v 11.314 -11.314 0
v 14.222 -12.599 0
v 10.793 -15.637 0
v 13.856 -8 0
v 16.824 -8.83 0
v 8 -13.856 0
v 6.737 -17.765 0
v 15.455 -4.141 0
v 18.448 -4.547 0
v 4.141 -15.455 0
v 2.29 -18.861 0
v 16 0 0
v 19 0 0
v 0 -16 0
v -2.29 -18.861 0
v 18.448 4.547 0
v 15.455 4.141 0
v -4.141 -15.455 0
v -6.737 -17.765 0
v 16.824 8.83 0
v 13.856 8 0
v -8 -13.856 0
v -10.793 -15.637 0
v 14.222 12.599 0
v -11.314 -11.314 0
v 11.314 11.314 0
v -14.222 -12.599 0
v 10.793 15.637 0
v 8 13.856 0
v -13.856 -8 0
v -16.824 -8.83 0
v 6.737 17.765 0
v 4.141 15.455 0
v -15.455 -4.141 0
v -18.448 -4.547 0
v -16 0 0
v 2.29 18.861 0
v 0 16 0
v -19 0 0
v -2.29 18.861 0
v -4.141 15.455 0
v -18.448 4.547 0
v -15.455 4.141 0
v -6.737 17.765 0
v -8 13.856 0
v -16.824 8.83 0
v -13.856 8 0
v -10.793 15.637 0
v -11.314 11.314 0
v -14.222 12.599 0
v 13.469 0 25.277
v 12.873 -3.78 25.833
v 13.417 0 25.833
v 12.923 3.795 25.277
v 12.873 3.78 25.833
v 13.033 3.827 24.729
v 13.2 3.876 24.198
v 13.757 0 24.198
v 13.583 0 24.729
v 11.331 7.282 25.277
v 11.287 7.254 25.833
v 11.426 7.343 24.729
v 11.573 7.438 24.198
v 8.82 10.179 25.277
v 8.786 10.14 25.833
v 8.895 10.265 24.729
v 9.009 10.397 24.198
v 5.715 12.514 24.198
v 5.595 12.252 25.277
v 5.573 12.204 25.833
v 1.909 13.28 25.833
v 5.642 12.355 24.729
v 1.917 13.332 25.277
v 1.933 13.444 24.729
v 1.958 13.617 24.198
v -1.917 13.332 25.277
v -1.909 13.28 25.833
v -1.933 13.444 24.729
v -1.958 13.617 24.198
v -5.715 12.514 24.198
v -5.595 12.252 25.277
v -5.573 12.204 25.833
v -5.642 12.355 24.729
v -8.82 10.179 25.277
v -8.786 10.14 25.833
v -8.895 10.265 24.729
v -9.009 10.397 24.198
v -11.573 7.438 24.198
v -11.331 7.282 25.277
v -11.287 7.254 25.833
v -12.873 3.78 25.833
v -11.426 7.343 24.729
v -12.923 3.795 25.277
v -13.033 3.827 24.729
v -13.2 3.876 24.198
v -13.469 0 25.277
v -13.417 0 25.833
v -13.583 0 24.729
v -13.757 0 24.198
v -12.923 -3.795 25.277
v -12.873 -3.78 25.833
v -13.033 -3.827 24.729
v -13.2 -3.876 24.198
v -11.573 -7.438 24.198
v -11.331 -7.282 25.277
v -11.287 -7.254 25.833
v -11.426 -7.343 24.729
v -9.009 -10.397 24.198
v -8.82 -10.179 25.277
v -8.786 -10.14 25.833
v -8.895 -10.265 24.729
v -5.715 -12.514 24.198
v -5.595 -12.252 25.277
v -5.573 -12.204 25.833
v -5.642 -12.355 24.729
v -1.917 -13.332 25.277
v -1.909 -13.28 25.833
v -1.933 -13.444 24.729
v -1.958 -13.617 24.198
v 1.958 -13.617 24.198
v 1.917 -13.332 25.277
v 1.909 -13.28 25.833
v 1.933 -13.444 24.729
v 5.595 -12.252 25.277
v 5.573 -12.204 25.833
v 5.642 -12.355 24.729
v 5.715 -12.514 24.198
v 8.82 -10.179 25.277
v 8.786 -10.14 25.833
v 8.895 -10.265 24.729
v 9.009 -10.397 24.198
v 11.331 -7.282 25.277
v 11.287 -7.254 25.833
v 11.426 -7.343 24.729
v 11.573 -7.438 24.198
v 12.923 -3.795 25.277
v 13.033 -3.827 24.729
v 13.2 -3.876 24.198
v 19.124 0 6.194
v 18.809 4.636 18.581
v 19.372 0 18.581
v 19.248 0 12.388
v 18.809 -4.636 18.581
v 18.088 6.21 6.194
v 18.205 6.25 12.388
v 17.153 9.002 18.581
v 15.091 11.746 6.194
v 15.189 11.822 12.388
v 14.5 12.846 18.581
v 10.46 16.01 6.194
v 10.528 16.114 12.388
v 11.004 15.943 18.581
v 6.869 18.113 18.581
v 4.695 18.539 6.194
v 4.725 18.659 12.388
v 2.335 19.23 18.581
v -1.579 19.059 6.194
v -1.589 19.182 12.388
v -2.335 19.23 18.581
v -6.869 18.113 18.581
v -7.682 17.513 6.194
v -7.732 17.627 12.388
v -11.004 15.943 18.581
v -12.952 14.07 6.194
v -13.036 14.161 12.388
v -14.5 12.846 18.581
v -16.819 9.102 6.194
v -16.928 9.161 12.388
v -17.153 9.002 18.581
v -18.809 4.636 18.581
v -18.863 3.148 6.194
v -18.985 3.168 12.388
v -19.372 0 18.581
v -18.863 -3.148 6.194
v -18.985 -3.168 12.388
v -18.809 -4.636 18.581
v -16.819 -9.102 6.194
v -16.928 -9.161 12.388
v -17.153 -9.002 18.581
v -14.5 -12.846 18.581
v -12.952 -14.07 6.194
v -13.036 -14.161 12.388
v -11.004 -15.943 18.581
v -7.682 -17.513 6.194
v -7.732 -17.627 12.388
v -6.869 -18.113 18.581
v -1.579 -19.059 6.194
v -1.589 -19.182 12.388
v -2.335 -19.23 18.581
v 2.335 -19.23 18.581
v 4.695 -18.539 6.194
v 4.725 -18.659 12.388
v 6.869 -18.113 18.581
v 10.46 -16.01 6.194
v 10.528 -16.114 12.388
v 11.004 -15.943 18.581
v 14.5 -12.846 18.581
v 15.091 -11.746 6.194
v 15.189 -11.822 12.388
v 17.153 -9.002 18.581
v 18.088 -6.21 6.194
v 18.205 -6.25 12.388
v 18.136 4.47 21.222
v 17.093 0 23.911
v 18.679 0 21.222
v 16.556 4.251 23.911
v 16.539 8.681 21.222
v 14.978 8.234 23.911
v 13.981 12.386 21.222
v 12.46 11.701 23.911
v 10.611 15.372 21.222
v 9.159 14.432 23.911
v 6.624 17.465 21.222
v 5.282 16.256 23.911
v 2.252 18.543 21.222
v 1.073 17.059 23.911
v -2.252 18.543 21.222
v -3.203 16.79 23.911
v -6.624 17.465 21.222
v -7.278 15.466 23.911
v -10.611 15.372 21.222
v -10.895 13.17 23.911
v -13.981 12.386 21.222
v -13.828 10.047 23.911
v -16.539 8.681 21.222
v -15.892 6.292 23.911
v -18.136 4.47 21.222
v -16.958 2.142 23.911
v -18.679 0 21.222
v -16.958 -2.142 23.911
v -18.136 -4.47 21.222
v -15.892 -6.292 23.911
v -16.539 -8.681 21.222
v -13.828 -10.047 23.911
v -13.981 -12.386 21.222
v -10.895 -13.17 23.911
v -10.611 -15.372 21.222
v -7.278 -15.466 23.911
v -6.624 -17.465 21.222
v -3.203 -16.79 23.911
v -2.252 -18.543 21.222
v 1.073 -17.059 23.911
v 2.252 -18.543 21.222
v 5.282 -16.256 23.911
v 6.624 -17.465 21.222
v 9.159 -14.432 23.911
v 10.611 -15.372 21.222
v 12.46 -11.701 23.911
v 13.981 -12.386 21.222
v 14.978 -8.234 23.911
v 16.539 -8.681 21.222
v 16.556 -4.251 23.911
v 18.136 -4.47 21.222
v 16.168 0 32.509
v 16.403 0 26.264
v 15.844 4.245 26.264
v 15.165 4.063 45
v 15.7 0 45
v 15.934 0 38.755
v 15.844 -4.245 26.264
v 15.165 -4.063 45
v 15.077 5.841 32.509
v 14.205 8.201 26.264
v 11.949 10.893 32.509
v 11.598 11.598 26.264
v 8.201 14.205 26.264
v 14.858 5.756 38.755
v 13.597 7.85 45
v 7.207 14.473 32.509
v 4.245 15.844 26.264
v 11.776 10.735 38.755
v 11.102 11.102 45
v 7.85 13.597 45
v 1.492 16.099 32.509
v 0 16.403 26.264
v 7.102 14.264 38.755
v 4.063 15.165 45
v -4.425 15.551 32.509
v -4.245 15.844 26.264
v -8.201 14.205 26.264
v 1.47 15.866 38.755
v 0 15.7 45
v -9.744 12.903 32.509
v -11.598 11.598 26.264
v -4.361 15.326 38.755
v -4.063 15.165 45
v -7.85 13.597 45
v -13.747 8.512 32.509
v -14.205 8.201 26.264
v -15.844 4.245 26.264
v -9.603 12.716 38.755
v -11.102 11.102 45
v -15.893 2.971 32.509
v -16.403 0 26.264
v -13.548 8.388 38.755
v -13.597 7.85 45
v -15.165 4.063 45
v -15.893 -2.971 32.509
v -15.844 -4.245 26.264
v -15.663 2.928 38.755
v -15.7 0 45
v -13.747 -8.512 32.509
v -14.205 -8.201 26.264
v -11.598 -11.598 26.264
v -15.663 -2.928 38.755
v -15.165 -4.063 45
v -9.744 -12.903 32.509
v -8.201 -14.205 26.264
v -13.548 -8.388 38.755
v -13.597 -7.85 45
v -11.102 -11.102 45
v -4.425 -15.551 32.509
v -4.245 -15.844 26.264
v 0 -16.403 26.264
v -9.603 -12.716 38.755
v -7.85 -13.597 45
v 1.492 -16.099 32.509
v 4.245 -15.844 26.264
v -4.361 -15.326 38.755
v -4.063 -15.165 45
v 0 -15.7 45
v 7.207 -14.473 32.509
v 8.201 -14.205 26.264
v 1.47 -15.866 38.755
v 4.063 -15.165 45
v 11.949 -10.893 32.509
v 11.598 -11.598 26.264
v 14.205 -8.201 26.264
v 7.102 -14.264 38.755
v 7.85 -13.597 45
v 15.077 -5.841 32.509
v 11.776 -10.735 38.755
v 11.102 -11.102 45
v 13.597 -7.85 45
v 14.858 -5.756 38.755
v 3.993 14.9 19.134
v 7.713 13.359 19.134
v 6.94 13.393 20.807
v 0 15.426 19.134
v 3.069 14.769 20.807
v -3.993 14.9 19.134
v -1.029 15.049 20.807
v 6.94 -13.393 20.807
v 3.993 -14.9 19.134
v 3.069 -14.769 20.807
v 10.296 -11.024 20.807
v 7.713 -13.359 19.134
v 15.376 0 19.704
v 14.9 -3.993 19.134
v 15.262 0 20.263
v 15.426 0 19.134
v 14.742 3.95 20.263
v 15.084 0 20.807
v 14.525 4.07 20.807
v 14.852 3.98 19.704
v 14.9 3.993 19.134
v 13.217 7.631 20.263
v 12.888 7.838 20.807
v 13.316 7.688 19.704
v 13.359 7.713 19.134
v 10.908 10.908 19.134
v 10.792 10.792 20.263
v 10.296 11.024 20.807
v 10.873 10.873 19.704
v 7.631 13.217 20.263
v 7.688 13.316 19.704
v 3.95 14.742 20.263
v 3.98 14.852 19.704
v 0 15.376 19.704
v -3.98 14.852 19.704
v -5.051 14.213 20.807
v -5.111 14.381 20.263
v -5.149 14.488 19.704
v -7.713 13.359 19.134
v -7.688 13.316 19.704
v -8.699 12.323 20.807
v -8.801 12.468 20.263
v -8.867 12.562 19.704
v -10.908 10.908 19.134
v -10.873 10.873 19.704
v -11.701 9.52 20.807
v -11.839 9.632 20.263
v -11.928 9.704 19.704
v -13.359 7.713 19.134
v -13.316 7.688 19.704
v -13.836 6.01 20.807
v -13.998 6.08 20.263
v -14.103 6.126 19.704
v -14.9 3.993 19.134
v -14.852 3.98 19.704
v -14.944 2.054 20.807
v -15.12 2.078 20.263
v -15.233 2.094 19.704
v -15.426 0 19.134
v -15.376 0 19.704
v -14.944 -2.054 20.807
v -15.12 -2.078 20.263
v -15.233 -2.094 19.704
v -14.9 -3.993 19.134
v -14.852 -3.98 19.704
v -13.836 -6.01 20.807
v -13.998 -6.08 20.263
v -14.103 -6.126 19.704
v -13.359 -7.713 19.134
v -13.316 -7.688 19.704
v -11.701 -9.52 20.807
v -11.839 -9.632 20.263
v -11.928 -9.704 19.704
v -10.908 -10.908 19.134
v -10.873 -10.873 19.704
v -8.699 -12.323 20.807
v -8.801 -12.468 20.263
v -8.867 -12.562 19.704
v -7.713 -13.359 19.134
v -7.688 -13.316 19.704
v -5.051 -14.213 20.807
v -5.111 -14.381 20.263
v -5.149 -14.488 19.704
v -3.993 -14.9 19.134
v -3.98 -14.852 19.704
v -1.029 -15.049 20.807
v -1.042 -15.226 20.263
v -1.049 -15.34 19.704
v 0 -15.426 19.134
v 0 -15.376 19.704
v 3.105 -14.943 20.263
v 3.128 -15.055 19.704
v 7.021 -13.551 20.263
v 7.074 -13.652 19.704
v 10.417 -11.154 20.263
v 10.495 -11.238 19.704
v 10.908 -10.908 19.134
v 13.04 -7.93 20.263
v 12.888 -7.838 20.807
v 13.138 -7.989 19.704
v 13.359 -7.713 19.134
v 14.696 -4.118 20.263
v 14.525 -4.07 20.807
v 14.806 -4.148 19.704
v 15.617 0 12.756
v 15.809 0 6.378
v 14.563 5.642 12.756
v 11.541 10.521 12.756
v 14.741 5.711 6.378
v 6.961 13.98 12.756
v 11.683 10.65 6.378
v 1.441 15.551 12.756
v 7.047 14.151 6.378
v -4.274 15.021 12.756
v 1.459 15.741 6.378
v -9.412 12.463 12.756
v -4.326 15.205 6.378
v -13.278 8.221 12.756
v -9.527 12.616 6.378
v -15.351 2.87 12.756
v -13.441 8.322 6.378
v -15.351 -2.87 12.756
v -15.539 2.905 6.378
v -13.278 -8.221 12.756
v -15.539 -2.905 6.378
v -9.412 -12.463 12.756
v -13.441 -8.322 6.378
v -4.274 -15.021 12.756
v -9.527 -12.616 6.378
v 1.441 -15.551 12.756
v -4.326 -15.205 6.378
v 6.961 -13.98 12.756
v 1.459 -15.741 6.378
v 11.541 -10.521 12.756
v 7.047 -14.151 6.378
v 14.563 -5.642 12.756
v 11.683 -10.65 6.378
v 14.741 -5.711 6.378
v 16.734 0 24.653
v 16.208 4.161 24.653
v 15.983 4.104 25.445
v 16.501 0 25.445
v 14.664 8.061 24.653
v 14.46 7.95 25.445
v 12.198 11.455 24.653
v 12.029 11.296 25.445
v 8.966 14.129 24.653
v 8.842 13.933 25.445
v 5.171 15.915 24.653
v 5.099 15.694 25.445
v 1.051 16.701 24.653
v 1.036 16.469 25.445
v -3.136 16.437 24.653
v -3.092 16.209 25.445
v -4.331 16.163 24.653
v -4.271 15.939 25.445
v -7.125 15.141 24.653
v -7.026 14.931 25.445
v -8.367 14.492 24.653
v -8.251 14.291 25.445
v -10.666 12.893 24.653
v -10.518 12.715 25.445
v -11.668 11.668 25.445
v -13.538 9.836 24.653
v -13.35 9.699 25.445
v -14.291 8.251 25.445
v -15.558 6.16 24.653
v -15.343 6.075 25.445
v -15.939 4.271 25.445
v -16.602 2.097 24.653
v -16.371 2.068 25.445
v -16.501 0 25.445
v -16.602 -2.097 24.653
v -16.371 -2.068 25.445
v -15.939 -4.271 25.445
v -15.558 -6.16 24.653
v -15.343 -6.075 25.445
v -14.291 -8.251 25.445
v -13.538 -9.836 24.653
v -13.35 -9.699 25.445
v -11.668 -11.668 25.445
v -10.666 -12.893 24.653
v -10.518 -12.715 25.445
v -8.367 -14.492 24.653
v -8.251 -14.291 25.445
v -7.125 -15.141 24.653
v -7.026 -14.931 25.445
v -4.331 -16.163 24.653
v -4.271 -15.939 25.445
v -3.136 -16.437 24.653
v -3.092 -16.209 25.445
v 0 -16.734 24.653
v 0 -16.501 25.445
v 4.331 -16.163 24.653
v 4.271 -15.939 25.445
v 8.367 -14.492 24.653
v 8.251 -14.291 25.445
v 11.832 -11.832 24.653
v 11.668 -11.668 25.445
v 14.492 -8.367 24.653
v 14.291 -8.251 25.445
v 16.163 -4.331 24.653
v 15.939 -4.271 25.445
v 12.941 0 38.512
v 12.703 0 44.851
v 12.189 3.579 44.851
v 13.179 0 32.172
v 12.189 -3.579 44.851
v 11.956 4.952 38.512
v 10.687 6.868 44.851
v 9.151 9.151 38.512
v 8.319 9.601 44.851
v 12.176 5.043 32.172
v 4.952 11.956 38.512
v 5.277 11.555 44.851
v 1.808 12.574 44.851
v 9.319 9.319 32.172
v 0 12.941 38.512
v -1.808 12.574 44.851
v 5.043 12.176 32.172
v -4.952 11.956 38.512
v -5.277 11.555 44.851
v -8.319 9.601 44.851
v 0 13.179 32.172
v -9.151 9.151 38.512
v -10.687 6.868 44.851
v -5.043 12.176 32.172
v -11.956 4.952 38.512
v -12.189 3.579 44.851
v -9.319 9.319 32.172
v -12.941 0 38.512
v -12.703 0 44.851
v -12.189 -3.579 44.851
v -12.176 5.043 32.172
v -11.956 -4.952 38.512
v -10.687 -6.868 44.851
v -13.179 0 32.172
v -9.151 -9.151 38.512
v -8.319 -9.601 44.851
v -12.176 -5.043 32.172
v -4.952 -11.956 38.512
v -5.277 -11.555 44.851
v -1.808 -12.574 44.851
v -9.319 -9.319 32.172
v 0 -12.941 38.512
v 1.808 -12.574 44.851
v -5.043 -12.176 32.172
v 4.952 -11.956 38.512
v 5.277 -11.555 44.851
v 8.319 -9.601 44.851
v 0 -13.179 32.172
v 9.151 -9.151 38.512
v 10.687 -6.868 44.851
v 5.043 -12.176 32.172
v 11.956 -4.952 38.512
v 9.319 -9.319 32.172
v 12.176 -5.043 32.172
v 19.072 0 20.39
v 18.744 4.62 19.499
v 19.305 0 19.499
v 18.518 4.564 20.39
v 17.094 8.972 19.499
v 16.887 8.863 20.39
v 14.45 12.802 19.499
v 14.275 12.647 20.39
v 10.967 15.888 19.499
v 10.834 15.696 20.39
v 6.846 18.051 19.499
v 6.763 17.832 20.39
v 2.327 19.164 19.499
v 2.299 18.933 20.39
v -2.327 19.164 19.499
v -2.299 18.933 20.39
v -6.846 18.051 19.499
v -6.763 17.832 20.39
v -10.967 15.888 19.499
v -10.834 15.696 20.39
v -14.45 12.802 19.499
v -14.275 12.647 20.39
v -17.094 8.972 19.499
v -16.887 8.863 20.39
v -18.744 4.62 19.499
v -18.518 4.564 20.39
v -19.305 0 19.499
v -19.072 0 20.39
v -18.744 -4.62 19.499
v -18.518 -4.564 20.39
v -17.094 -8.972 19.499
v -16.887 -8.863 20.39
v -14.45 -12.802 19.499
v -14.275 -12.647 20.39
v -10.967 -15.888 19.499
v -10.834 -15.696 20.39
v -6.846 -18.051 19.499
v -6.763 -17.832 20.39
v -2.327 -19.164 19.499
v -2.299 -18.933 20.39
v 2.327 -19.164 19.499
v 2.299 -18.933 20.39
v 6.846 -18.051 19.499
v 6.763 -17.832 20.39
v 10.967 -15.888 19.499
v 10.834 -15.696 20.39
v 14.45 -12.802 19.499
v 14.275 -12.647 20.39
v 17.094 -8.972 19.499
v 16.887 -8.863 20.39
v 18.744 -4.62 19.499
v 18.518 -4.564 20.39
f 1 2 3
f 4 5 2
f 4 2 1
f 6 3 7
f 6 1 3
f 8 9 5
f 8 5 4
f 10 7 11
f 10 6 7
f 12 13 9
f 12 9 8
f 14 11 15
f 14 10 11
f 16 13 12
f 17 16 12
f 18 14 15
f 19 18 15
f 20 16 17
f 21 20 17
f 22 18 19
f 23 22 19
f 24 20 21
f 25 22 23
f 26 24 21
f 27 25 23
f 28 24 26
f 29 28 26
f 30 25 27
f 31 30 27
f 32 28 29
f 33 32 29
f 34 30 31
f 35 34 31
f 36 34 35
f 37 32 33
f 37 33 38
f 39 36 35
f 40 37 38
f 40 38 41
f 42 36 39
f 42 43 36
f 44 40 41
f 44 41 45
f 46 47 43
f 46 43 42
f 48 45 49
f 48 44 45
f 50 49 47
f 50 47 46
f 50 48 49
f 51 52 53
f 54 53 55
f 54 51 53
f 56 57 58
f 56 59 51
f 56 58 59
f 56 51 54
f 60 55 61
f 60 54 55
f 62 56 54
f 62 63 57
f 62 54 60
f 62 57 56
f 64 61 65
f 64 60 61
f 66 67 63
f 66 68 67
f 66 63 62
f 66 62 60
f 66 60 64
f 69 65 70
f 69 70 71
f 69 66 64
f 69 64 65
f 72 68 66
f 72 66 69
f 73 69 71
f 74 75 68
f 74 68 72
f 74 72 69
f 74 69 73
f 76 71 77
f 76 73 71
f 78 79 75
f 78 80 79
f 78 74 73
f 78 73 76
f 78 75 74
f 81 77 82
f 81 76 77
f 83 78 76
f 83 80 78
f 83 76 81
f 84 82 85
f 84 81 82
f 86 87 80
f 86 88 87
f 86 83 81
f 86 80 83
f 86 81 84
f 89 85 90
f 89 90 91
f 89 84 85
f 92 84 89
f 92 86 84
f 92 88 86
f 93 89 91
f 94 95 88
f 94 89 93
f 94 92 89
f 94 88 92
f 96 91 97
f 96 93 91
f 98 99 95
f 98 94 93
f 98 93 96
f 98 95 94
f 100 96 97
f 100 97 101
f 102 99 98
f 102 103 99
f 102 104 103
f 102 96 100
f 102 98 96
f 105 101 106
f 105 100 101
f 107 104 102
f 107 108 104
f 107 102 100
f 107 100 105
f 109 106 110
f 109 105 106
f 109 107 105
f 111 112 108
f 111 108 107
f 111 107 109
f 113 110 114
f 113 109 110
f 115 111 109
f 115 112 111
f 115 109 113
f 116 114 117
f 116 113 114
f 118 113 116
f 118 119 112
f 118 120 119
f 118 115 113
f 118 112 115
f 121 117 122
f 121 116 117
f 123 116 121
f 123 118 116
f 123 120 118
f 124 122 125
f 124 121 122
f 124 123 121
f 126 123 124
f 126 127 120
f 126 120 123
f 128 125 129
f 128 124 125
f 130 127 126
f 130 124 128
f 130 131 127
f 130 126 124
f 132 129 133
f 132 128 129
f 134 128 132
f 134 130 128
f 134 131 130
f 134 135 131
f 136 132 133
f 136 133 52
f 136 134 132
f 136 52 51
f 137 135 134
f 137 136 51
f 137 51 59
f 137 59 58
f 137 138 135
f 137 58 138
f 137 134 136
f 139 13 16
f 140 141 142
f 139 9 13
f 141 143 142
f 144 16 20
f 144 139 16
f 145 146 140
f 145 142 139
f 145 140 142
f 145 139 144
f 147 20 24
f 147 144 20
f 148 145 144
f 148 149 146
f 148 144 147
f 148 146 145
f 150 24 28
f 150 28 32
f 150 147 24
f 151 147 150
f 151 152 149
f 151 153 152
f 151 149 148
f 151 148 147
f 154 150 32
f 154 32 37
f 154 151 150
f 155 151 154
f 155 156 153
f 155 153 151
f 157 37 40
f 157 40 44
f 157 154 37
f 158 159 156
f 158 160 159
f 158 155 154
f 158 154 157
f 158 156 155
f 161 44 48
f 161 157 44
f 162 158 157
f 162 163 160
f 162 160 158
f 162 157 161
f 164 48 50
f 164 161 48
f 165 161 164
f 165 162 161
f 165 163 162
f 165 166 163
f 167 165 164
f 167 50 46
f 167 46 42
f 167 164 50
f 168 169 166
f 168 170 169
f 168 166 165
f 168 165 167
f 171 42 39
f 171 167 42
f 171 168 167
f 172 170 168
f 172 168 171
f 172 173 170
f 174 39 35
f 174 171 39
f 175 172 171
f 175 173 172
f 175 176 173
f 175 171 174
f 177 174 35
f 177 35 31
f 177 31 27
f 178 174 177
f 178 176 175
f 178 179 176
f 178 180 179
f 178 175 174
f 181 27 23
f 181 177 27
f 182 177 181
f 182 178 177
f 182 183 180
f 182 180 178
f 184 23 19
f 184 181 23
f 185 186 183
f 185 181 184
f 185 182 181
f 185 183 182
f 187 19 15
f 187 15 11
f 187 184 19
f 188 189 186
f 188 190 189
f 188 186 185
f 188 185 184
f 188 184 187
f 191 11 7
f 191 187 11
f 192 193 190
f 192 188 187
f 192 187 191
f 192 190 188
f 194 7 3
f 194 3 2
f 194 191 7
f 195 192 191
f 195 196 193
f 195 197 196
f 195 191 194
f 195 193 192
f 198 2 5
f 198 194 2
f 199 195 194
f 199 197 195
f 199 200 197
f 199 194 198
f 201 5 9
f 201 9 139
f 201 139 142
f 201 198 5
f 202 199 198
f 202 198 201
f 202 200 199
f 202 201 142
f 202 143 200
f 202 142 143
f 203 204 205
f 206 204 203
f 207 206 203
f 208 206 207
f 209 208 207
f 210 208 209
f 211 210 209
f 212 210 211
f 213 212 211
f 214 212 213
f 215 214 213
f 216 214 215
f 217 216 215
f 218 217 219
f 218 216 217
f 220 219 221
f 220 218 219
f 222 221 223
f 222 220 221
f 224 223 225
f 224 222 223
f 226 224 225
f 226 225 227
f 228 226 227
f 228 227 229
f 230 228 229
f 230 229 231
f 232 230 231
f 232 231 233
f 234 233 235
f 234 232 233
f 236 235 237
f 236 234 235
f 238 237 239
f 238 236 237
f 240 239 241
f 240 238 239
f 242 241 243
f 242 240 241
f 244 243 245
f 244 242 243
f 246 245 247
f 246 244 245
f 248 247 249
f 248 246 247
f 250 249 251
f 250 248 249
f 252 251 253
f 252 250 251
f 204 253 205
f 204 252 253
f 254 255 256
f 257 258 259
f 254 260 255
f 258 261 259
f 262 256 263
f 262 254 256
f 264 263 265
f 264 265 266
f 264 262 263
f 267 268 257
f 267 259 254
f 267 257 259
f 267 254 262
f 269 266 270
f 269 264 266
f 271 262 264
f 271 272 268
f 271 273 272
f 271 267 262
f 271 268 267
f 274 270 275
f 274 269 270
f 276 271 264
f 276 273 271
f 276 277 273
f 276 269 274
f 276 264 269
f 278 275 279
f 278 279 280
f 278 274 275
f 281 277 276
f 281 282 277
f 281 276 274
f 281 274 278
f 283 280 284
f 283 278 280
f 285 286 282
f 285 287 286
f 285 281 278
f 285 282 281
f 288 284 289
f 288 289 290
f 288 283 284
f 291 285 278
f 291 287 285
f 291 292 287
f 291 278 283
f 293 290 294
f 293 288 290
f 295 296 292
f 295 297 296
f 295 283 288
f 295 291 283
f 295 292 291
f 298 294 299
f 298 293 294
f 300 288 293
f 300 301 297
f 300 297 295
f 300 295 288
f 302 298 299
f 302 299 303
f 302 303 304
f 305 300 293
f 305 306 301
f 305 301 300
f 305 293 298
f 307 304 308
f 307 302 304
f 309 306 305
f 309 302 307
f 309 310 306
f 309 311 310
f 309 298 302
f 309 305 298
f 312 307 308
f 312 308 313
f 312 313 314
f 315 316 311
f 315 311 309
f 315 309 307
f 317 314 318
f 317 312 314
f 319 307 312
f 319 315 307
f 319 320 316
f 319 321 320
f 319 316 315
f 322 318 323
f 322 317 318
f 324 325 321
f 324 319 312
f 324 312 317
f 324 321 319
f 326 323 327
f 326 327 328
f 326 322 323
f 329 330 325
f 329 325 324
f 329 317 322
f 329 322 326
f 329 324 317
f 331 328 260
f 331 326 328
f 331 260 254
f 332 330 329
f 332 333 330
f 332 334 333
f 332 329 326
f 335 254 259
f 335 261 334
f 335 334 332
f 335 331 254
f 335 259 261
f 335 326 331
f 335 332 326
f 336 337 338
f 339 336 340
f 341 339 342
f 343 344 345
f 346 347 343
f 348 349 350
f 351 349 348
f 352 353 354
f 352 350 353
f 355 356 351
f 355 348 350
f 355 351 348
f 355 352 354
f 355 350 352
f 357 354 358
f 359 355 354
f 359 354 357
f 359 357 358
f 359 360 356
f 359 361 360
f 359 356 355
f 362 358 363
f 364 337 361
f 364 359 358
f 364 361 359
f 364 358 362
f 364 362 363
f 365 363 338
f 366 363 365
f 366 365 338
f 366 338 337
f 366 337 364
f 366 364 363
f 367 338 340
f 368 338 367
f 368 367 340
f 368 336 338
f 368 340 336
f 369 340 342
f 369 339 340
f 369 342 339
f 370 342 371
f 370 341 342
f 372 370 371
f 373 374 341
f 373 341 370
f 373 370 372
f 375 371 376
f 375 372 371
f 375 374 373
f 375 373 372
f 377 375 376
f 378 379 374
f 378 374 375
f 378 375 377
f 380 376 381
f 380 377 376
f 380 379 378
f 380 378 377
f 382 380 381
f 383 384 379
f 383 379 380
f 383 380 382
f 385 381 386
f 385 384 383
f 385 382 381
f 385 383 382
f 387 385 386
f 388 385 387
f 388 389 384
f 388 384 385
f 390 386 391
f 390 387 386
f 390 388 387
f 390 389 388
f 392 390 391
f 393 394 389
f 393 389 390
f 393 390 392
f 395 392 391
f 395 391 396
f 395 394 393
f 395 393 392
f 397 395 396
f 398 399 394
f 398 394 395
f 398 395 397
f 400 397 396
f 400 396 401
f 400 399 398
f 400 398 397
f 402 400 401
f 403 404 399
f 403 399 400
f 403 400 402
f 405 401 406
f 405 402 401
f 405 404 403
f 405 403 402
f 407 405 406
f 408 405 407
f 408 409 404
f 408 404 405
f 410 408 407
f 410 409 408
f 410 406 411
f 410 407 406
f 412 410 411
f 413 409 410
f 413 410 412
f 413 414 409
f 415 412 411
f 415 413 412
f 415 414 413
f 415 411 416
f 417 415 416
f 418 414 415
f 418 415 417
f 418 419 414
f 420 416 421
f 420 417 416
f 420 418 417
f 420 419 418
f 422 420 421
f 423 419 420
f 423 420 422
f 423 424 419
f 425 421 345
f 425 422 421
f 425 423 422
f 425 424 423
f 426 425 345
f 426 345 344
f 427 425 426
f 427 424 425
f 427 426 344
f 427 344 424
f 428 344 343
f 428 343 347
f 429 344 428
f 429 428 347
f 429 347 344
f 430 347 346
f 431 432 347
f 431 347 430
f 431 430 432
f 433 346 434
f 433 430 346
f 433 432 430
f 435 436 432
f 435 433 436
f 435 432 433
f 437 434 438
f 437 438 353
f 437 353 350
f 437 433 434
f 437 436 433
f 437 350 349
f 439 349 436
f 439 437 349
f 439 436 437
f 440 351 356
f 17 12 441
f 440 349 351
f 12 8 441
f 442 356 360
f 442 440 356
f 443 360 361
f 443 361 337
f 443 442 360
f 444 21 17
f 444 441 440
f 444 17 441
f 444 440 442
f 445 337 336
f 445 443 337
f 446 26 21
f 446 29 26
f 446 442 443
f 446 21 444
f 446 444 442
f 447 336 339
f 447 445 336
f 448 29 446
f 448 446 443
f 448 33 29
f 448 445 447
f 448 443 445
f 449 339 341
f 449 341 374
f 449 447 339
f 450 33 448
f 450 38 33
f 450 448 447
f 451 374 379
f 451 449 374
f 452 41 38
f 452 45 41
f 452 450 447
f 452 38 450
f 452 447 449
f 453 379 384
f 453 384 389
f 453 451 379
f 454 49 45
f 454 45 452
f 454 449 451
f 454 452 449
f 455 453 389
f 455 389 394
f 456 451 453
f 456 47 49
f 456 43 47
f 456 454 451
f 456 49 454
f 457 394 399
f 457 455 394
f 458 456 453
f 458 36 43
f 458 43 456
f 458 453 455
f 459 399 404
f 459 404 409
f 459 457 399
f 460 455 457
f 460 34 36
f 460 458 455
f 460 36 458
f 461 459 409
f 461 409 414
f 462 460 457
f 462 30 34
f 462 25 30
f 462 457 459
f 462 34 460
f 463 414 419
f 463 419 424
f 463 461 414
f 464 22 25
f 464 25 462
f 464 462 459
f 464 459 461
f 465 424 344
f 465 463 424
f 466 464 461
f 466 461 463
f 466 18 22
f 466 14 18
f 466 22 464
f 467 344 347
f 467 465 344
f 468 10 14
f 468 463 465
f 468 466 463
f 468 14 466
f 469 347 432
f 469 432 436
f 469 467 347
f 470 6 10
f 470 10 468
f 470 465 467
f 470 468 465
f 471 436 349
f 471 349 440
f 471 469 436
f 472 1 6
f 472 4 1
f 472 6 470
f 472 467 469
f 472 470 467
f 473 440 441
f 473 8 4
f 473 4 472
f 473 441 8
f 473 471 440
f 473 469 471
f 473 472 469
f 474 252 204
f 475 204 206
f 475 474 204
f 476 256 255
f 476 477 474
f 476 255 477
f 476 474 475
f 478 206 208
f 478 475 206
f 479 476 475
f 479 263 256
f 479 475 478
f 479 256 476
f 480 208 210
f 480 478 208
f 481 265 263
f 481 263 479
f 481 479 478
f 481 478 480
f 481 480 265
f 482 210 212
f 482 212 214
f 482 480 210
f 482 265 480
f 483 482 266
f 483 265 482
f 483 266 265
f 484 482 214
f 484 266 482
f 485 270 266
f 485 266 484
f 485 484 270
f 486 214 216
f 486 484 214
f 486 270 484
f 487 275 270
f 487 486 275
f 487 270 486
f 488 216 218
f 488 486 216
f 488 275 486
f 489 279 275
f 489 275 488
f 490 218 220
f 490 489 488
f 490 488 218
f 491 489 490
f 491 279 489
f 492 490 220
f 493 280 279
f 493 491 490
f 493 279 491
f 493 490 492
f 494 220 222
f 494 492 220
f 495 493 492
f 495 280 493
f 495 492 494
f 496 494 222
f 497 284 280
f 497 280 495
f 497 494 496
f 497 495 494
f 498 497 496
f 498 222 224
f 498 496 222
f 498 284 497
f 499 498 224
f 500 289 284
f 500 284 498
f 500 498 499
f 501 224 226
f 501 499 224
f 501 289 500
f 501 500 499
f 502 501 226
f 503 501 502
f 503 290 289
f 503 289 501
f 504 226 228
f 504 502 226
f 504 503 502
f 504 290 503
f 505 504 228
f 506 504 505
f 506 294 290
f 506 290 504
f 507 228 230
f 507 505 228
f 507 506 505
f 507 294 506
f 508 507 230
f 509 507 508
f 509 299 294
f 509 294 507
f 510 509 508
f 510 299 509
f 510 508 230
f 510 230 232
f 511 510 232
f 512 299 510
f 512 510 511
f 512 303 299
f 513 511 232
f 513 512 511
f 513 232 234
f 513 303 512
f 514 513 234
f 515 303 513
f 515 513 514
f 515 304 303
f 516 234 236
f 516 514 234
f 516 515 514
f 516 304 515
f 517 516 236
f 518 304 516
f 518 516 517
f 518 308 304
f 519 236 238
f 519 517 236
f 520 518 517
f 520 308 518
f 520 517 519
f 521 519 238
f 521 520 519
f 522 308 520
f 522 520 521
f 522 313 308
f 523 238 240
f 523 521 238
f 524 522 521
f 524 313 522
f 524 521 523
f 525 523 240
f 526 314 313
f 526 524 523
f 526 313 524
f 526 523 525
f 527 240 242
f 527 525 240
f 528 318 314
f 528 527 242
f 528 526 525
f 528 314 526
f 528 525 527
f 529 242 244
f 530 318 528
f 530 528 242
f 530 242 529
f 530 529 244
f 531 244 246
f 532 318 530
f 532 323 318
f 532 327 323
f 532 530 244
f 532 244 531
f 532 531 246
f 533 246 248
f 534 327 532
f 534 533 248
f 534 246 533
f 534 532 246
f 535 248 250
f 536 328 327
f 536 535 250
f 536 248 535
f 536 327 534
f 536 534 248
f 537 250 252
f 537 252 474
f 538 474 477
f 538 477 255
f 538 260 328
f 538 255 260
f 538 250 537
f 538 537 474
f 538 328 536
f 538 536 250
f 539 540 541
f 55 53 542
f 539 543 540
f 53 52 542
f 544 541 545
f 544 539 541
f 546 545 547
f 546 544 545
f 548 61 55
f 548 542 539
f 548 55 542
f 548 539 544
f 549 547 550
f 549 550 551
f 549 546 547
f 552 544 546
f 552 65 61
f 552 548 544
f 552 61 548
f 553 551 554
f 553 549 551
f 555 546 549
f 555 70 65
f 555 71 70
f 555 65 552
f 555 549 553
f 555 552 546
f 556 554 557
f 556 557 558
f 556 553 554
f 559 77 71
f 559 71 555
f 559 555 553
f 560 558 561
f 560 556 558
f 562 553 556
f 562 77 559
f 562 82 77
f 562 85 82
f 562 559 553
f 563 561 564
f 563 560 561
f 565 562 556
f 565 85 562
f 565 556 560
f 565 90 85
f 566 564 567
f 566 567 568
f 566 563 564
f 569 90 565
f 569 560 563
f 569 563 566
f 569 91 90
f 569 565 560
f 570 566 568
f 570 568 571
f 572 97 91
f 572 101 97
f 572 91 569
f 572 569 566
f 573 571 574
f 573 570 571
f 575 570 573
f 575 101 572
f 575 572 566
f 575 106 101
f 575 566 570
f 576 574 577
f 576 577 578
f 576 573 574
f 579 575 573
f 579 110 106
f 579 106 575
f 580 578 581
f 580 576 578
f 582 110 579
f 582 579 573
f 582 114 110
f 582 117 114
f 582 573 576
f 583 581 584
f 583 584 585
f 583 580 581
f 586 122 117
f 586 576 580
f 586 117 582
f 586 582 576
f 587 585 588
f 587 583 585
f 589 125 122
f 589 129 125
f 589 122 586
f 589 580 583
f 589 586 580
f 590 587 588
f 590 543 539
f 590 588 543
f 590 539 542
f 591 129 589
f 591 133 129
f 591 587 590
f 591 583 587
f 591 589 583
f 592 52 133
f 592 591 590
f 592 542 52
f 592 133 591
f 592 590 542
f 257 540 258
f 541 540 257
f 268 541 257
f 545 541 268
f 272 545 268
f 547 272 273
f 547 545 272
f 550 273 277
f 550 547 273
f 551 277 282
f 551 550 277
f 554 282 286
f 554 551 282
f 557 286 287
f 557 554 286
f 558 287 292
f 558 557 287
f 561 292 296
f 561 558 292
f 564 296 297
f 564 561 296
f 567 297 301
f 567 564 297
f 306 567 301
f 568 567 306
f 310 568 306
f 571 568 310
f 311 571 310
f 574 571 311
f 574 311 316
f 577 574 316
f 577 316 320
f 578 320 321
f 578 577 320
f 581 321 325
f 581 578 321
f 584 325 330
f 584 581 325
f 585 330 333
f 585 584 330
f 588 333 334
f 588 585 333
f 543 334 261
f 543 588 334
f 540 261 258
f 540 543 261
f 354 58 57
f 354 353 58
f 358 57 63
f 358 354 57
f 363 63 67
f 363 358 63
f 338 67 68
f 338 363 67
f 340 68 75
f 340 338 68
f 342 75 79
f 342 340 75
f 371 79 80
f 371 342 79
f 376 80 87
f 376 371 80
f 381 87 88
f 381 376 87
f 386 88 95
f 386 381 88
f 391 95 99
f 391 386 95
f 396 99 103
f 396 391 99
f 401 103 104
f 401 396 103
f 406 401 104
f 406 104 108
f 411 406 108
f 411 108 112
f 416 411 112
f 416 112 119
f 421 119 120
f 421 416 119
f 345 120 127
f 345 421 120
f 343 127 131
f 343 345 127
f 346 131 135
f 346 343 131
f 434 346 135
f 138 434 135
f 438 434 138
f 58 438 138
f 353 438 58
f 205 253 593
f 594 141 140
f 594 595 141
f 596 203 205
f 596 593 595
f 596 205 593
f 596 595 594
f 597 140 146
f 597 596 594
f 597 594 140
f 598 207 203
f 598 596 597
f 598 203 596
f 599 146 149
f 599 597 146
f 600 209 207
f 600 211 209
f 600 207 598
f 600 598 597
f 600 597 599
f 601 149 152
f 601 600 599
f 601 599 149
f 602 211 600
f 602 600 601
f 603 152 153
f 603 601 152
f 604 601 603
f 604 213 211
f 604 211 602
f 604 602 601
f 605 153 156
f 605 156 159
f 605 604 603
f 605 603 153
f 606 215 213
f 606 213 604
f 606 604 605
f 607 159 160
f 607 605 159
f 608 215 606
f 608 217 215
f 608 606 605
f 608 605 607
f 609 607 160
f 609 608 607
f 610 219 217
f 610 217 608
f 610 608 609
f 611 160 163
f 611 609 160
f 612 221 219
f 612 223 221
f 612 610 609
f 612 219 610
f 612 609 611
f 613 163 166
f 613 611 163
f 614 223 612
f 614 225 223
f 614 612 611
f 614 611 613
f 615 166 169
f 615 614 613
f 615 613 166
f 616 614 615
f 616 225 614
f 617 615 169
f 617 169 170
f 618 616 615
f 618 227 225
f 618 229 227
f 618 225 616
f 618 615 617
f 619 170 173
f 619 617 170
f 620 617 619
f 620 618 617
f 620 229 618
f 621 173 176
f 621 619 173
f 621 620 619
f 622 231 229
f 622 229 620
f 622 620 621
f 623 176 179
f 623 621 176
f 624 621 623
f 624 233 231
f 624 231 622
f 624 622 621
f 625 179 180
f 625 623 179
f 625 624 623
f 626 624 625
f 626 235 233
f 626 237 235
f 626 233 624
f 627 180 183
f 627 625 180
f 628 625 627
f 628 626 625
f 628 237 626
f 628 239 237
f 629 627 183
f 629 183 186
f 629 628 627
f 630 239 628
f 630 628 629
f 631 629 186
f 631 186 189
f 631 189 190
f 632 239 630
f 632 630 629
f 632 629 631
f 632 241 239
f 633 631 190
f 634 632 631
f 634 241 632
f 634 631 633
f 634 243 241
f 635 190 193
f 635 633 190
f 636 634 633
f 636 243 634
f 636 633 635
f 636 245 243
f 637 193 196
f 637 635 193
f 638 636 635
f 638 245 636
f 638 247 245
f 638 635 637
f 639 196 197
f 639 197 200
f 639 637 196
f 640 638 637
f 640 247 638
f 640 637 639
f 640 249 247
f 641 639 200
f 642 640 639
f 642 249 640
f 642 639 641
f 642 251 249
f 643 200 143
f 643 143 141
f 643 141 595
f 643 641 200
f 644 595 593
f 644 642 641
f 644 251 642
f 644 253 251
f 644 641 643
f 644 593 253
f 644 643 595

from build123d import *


with BuildPart() as f1:
    # F0 (on Front) → F1 (revolve)
    with BuildSketch(Plane.XZ):
        with BuildLine():
            Line((15.425971, 19.134293), (16, 0))
            Line((16, 0), (19, 0))
            Line((19, 0), (19.371627, 18.581355))
            ThreePointArc((19.371627, 18.581355), (19.209023, 19.949907), (18.678973, 21.22208))
            Line((18.678973, 21.22208), (17.092742, 23.910606))
            ThreePointArc((17.092742, 23.910606), (16.601144, 25.044324), (16.402601, 26.263982))
            Line((16.402601, 26.263982), (15.7, 45))
            Line((15.7, 45), (12.703474, 44.851139))
            Line((12.703474, 44.851139), (13.416649, 25.833132))
            ThreePointArc((13.416649, 25.833132), (13.518091, 25.00142), (13.756992, 24.198326))
            Line((13.756992, 24.198326), (15.084364, 20.806534))
            ThreePointArc((15.084364, 20.806534), (15.327049, 19.985097), (15.425971, 19.134293))
        make_face()
    revolve(axis=Axis((0, 0, 22.42557), (0, 0, 1)))


solid = f1.part
